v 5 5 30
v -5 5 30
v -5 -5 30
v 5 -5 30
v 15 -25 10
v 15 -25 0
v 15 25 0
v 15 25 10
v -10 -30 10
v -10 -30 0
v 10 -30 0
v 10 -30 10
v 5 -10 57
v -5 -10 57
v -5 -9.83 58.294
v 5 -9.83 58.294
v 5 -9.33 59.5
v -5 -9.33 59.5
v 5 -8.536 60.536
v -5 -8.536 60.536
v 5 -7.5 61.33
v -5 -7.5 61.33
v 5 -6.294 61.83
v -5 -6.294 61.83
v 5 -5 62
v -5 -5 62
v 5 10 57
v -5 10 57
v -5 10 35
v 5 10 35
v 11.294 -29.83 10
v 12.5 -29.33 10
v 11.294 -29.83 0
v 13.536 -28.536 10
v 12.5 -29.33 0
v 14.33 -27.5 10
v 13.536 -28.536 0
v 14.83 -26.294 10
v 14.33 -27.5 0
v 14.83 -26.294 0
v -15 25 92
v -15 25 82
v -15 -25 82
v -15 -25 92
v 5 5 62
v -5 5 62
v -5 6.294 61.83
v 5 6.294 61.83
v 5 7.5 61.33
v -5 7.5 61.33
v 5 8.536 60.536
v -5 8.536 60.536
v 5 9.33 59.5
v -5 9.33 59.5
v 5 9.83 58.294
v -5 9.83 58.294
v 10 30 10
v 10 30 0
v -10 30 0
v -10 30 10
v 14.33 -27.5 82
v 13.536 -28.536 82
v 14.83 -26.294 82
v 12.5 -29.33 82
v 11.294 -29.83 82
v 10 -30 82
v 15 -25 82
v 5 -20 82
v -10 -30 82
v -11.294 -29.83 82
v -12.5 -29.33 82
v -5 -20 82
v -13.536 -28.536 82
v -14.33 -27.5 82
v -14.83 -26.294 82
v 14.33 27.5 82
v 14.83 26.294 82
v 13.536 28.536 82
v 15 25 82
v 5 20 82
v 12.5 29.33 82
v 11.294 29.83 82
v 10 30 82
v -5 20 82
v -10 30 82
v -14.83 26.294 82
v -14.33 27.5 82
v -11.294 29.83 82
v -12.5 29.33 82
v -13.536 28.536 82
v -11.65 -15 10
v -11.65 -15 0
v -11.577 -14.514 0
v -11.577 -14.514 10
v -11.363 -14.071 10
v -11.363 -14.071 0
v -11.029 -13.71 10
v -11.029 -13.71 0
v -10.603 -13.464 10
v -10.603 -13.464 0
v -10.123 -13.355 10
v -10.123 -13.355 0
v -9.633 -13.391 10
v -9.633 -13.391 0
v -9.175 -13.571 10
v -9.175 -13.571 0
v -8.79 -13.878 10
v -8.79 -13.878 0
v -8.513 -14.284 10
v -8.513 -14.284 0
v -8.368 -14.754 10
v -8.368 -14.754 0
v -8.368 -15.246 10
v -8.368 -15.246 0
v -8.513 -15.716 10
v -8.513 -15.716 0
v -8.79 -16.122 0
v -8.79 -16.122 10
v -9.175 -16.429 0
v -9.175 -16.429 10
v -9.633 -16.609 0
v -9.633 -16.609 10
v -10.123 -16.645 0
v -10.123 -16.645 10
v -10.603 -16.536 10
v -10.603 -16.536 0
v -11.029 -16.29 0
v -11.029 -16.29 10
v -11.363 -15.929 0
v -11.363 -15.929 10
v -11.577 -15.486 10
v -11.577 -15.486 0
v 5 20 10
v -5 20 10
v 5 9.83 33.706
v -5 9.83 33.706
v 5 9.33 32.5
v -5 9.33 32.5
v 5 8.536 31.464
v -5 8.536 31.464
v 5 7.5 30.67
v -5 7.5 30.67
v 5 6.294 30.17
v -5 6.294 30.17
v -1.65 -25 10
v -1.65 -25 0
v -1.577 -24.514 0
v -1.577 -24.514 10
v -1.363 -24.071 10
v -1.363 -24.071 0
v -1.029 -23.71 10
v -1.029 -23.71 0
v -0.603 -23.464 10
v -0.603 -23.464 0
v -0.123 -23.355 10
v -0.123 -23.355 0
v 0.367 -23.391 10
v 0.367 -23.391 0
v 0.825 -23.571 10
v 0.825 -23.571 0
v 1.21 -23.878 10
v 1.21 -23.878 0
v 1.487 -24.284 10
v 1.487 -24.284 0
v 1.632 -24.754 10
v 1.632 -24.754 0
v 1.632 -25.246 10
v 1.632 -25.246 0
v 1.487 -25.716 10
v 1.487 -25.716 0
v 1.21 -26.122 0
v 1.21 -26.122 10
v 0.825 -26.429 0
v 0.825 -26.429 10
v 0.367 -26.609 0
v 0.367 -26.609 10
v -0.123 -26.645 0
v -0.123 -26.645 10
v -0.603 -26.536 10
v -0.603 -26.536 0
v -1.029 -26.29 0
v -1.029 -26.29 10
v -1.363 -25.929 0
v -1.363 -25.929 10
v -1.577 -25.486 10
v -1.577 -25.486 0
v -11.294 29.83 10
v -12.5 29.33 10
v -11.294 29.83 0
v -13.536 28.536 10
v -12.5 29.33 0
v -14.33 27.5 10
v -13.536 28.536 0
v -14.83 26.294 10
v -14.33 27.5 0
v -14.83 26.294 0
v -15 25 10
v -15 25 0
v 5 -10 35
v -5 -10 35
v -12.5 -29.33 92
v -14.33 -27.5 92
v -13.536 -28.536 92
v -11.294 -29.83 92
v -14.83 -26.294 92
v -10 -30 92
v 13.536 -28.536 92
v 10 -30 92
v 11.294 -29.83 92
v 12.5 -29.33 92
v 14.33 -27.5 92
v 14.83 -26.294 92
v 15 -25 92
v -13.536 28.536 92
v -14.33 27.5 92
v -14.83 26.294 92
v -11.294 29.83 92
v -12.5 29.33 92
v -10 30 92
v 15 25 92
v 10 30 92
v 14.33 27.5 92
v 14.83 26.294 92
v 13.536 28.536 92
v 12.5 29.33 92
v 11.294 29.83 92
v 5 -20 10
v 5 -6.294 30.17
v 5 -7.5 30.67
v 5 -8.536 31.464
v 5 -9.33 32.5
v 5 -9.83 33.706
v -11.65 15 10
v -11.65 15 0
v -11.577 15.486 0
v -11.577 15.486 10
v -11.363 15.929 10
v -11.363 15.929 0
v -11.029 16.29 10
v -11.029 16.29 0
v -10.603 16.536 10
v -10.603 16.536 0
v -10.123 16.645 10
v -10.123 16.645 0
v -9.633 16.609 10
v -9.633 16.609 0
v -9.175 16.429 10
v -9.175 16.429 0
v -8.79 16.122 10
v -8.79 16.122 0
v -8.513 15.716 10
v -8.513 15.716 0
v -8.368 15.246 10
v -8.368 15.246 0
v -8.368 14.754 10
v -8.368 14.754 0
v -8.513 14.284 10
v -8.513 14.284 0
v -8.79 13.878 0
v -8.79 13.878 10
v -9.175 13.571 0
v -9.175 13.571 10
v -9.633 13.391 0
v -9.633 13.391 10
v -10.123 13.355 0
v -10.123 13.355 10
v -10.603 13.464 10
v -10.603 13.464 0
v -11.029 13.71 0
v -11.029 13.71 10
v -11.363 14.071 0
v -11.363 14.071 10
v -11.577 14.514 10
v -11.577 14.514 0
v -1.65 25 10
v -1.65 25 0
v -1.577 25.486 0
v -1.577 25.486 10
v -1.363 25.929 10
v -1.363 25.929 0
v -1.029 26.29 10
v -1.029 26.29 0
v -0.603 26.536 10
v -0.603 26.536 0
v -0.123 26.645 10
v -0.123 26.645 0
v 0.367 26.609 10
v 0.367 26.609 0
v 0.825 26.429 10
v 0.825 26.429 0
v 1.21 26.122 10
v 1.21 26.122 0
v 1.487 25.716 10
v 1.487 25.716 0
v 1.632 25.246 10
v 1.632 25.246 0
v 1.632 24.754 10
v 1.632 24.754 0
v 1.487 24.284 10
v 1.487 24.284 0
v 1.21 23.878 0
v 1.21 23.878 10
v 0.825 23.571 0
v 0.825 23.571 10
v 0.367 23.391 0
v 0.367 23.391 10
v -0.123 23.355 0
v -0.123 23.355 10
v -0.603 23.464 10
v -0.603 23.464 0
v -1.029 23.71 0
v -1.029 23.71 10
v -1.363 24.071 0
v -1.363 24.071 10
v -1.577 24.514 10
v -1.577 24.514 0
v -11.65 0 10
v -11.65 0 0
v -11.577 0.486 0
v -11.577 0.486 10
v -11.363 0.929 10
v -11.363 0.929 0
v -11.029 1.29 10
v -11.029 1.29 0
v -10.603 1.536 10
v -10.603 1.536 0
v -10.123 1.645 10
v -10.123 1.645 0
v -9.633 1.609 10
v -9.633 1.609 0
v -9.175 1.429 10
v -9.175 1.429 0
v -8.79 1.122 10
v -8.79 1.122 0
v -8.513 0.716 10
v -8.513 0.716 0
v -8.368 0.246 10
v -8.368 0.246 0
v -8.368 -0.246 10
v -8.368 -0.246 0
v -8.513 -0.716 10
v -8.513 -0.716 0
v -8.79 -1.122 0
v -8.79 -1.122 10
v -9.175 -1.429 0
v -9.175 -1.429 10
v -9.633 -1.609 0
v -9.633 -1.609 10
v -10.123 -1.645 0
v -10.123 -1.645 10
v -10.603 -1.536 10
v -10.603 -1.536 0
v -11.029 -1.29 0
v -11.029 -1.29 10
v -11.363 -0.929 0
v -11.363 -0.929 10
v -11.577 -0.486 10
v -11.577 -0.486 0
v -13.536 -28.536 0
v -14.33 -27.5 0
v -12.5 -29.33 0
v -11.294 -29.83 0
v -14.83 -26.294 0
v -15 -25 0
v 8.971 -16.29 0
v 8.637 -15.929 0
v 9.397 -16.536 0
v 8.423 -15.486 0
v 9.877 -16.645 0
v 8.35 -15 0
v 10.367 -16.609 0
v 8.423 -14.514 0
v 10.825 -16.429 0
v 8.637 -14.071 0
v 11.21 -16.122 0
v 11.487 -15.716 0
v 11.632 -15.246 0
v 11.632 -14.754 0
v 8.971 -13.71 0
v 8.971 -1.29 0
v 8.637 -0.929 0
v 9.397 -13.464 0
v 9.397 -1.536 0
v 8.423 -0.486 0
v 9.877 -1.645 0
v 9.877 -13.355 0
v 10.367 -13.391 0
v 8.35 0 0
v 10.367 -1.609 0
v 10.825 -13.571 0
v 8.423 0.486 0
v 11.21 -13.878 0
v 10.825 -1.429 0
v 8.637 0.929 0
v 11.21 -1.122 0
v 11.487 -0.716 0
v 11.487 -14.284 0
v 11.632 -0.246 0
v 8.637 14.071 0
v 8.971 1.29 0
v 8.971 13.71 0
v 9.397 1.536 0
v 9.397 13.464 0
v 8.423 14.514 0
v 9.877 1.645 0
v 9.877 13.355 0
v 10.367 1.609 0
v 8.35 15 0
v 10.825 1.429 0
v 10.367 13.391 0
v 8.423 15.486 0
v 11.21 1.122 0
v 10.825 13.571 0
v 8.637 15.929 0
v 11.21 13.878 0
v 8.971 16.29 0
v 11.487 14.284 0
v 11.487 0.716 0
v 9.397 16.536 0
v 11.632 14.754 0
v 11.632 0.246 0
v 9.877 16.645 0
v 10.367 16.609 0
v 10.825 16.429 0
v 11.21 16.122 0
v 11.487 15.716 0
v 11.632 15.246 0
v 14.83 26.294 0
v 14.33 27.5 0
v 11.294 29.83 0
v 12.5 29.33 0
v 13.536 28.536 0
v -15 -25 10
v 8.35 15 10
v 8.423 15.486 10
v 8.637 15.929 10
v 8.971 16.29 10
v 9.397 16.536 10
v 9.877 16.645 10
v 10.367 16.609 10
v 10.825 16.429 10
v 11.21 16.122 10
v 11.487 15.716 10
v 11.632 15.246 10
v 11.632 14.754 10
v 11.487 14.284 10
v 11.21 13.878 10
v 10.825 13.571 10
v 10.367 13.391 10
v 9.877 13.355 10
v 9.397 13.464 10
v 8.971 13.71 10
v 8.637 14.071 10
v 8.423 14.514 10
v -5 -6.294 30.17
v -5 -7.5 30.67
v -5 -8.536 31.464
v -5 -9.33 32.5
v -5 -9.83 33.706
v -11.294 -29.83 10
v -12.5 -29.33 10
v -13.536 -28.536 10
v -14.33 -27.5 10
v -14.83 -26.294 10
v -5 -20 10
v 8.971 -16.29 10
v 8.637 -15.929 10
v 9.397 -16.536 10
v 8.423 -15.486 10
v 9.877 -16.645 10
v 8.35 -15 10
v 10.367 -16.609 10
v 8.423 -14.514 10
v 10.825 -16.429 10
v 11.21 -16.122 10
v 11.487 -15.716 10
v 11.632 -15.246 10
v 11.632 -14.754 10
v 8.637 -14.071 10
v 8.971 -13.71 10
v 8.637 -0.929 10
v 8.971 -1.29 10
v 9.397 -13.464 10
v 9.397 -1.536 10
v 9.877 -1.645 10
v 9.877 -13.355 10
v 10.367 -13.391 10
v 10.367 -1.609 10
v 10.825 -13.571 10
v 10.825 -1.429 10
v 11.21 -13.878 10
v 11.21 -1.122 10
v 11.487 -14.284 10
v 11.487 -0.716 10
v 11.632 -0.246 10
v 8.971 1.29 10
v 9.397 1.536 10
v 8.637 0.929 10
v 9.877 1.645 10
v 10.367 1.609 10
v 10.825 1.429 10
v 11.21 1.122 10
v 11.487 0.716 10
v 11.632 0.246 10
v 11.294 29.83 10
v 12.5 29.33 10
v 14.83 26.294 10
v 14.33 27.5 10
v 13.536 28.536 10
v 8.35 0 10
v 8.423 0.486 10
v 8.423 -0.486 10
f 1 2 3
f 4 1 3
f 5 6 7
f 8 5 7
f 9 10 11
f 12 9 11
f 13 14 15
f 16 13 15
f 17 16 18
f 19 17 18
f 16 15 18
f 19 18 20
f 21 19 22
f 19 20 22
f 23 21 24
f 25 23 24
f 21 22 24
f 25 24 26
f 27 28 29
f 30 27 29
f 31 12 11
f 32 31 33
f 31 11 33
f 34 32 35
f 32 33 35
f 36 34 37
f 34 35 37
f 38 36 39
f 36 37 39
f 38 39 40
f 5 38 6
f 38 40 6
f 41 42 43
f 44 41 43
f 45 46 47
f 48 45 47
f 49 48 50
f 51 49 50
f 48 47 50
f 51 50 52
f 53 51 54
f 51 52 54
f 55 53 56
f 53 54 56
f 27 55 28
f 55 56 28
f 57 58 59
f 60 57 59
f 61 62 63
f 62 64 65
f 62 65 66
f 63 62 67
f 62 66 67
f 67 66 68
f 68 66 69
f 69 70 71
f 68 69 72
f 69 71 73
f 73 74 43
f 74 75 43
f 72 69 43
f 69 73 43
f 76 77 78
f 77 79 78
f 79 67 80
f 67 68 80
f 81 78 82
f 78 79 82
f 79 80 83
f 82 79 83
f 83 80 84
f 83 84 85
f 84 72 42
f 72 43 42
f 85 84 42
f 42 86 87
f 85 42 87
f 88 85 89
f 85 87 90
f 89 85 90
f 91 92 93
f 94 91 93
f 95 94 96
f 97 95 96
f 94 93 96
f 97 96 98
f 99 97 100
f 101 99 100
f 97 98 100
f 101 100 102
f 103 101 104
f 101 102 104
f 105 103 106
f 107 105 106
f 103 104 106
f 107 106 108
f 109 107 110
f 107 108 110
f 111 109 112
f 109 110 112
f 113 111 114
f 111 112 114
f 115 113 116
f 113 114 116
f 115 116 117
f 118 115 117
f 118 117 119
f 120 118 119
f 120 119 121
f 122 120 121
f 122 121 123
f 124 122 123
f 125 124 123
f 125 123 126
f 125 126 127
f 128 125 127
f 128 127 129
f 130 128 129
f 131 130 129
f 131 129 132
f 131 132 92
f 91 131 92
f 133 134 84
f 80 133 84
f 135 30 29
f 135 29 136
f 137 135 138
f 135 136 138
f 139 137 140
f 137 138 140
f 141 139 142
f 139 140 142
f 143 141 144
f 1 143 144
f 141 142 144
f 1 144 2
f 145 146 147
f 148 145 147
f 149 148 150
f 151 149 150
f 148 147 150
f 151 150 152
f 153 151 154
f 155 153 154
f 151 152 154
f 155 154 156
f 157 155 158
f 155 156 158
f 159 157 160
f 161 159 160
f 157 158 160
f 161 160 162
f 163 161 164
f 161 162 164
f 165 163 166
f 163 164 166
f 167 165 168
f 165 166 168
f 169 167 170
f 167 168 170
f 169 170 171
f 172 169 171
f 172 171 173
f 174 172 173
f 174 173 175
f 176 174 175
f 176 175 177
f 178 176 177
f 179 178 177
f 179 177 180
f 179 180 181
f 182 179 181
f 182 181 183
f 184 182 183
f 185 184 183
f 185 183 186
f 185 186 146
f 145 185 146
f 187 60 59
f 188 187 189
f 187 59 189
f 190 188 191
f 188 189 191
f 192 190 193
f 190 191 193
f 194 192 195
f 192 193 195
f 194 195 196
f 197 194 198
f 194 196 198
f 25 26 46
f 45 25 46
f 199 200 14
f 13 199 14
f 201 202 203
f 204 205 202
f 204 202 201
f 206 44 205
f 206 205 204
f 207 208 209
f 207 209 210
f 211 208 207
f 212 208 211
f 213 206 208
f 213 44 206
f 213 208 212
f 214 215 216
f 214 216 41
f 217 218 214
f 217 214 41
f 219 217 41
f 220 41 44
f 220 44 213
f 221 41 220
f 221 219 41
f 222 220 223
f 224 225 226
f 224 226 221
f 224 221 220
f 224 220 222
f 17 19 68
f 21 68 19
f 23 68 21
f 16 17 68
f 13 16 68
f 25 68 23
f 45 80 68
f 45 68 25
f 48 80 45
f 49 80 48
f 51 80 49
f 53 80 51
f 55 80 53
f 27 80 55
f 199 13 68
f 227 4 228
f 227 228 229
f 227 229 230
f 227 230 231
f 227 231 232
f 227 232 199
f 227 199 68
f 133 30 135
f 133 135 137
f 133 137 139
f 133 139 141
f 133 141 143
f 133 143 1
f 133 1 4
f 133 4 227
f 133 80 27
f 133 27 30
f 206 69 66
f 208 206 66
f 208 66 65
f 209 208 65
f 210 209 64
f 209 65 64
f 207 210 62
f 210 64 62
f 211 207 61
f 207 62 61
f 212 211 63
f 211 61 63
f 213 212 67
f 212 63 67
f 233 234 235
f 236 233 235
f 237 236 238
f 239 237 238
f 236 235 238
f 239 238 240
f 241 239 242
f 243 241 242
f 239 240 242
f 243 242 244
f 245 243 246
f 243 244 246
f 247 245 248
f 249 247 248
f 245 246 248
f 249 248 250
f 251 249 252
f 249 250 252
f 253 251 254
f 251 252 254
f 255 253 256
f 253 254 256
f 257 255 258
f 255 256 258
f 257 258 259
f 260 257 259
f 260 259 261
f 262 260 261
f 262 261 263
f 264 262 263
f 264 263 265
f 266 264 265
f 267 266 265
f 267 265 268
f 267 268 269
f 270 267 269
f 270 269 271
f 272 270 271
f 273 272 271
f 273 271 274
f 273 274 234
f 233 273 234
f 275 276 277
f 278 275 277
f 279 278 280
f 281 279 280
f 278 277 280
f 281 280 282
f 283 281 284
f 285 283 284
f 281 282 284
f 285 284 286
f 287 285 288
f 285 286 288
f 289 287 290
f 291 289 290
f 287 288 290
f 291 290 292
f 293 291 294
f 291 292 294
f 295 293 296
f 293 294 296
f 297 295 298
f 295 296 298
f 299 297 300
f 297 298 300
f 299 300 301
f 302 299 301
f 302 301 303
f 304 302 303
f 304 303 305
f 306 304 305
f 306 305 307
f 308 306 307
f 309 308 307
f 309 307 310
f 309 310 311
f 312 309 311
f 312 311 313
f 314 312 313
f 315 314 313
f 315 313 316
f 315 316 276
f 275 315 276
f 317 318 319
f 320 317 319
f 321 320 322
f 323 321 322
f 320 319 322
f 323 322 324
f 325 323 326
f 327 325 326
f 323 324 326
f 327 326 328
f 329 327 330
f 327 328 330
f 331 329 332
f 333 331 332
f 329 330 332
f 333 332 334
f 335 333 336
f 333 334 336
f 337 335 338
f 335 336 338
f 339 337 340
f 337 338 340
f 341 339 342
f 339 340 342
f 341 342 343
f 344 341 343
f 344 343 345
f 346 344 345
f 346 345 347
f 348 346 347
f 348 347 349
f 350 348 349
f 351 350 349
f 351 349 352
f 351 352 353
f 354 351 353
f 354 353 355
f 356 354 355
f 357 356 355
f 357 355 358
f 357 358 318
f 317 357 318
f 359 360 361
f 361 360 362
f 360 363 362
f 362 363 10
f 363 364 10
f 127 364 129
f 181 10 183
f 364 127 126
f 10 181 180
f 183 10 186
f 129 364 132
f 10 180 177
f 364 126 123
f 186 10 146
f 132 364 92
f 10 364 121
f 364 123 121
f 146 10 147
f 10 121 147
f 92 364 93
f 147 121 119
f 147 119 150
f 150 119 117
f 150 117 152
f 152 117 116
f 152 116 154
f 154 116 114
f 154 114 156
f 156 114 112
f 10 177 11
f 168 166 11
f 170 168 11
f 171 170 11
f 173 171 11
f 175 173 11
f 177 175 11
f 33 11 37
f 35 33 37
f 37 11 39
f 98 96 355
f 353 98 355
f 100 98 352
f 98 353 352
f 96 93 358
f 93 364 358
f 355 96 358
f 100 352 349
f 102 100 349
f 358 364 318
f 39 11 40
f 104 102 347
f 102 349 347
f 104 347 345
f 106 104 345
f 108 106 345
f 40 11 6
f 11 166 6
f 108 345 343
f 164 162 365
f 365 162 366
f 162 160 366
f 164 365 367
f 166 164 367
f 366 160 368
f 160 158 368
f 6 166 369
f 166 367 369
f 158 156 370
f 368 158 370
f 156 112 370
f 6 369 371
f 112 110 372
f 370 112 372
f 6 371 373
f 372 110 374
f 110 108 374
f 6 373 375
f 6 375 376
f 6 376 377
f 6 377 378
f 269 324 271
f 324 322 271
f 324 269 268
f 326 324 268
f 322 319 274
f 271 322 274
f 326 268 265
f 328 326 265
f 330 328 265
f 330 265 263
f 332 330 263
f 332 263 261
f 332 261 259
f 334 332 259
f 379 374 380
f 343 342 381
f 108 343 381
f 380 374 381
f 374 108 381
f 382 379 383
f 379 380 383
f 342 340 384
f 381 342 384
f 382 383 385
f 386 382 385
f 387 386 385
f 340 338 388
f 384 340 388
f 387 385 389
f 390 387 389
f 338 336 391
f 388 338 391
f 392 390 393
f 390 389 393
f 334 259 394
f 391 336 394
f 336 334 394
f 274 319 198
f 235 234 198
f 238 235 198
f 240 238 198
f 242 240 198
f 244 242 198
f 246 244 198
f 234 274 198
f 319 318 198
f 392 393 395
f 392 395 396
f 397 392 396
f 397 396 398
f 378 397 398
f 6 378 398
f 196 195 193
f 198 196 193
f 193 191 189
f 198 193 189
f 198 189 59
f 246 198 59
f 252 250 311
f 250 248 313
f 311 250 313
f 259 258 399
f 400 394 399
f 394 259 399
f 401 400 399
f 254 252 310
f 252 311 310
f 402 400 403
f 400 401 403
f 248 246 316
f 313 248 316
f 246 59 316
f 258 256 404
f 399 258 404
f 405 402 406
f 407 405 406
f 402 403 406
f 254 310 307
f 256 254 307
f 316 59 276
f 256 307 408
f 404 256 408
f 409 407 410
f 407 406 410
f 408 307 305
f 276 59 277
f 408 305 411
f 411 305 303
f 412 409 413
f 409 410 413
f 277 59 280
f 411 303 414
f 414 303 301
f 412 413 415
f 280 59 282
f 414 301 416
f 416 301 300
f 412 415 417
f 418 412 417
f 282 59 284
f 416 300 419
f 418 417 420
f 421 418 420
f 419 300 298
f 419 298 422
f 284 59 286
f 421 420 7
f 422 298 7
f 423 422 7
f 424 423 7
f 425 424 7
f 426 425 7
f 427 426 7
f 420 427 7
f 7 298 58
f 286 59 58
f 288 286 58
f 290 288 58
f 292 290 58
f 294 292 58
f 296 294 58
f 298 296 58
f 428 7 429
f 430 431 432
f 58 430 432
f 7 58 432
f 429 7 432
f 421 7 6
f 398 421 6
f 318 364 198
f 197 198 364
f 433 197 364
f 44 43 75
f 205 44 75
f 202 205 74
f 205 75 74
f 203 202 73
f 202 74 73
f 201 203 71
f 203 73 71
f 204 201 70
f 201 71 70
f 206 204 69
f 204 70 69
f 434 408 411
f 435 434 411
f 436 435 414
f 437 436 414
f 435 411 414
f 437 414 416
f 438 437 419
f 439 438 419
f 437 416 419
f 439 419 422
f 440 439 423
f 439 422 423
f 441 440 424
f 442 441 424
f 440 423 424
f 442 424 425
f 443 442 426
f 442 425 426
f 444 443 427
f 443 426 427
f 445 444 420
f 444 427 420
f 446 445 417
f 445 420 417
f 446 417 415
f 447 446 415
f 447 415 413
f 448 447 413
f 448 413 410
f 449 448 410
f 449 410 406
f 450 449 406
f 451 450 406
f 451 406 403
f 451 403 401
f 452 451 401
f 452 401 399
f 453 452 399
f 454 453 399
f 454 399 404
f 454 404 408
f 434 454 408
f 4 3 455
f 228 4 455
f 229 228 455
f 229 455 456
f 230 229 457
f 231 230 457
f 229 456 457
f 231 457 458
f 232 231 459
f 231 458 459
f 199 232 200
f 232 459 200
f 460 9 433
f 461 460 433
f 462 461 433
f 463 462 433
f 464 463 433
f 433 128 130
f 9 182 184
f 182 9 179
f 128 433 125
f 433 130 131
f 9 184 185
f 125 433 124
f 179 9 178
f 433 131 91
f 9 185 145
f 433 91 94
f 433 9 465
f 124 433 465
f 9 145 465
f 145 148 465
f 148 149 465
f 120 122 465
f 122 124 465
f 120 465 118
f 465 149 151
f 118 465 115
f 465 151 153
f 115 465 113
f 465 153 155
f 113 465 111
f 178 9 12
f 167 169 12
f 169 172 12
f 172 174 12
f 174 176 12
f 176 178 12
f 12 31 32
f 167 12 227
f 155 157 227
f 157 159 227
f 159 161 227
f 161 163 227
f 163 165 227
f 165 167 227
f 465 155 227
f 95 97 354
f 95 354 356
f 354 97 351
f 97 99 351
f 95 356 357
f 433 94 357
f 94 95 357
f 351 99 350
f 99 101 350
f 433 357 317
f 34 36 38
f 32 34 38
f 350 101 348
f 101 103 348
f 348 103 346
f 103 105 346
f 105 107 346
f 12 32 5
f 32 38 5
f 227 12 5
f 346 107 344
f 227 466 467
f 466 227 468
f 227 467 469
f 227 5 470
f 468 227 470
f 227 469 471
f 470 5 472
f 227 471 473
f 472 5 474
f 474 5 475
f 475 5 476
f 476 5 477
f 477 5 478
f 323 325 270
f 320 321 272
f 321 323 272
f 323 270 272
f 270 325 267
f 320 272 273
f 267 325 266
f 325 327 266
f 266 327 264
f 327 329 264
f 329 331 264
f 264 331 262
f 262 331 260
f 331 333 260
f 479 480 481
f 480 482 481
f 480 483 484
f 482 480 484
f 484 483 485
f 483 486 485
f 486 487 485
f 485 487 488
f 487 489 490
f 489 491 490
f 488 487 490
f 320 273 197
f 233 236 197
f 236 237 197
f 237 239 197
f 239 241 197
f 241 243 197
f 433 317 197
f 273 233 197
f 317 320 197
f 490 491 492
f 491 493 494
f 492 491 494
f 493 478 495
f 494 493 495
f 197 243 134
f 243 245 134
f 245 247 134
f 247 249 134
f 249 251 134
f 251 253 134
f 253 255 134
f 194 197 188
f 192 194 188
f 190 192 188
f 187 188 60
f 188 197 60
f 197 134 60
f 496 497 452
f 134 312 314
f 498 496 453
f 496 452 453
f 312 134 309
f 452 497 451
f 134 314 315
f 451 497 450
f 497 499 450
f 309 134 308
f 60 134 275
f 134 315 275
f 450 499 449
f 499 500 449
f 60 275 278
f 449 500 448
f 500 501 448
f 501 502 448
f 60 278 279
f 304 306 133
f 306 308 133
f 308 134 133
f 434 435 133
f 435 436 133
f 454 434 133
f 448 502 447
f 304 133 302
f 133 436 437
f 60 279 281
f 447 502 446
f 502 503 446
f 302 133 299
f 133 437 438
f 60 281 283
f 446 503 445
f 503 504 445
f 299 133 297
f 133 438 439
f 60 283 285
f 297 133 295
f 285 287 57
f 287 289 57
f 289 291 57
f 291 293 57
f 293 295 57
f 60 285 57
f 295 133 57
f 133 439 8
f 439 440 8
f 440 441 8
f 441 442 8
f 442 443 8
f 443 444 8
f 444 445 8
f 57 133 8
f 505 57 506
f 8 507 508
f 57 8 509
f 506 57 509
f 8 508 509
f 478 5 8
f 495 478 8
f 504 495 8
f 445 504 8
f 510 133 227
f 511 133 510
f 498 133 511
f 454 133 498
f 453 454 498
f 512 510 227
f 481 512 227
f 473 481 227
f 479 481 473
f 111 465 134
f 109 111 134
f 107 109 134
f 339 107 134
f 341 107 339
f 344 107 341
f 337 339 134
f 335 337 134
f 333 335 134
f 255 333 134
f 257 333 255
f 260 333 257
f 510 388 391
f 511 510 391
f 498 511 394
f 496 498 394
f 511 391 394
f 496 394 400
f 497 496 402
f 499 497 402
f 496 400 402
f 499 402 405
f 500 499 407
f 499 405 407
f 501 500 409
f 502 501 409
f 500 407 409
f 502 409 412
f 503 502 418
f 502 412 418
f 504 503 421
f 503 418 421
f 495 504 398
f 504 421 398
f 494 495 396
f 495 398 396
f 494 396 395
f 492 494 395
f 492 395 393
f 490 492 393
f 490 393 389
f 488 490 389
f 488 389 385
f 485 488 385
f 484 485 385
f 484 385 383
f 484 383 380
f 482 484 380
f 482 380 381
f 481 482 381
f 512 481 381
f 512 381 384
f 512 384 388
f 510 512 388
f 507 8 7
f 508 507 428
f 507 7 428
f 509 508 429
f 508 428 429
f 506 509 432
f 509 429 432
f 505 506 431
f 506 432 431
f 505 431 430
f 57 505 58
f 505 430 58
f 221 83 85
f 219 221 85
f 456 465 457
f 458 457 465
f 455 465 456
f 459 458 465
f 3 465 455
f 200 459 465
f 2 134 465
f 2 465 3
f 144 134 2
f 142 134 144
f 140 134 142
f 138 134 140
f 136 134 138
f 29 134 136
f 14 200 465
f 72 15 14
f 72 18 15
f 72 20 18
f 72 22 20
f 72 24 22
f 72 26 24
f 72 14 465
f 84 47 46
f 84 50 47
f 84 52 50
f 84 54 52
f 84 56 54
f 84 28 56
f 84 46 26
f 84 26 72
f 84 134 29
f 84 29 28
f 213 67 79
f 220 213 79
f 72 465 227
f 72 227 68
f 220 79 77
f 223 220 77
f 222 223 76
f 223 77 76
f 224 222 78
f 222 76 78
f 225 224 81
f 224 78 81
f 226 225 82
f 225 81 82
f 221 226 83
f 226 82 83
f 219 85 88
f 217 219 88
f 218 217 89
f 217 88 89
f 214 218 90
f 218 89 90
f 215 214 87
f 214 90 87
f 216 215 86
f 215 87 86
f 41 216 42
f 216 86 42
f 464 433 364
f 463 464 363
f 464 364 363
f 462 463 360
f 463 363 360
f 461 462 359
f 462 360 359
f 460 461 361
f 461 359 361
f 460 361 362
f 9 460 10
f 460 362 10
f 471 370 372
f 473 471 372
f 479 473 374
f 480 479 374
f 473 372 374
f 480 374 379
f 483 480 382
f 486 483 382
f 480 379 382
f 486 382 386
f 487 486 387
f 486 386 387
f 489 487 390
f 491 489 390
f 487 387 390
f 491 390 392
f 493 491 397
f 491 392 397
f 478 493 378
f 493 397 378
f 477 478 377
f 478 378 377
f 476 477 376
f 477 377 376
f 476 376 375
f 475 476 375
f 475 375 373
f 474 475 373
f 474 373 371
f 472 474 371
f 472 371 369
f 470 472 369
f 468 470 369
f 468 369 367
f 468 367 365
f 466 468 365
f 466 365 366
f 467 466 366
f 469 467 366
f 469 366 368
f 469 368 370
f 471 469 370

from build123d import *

# Parameters (mm, degrees)
BOSS_EXTRUDE1_DEPTH       = 92
CUT_EXTRUDE1_DEPTH        = 102.311401135
CUT_EXTRUDE1_DEPTH_BACK   = 10
SKETCH3_W                 = 72
SKETCH3_H                 = 50
CUT_EXTRUDE2_DEPTH        = 10
SKETCH4_W                 = 72
SKETCH4_H                 = 10
CUT_EXTRUDE3_DEPTH        = 10
SKETCH5_W                 = 72
SKETCH5_H                 = 10
CUT_EXTRUDE4_DEPTH        = 10
M4X0_7_TAPPED_HOLE1_D     = 3.3
M4X0_7_TAPPED_HOLE1_DEPTH = 10
M4X0_7_TAPPED_HOLE2_D     = 3.3
M4X0_7_TAPPED_HOLE2_DEPTH = 10
M4X0_7_TAPPED_HOLE3_D     = 3.3
M4X0_7_TAPPED_HOLE3_DEPTH = 10
M4X0_7_TAPPED_HOLE4_D     = 3.3
M4X0_7_TAPPED_HOLE4_DEPTH = 10
M4X0_7_TAPPED_HOLE5_D     = 3.3
M4X0_7_TAPPED_HOLE5_DEPTH = 10
M4X0_7_TAPPED_HOLE6_D     = 3.3
M4X0_7_TAPPED_HOLE6_DEPTH = 10
M4X0_7_TAPPED_HOLE7_D     = 3.3
M4X0_7_TAPPED_HOLE7_DEPTH = 10
M4X0_7_TAPPED_HOLE8_D     = 3.3
M4X0_7_TAPPED_HOLE8_DEPTH = 10
CUT_EXTRUDE5_DEPTH        = 10
CUT_EXTRUDE8_DEPTH        = 10
CUT_EXTRUDE9_DEPTH        = 10


with BuildPart() as part:
    # Sketch1 → Boss-Extrude1 (new body)
    with BuildSketch(Plane.XY):
        with BuildLine():
            Line((-10, -30), (10, -30))
            ThreePointArc((10, -30), (13.535533906, -28.535533906), (15, -25))
            Line((15, -25), (15, 25))
            ThreePointArc((15, 25), (13.535533906, 28.535533906), (10, 30))
            Line((10, 30), (-10, 30))
            ThreePointArc((-10, 30), (-13.535533906, 28.535533906), (-15, 25))
            Line((-15, 25), (-15, -25))
            ThreePointArc((-15, -25), (-13.535533906, -28.535533906), (-10, -30))
        make_face()
    extrude(amount=BOSS_EXTRUDE1_DEPTH)

    # Sketch2 → Cut-Extrude1 (cut, two sides: drawn at the far end of the back side and taken through both)
    with BuildSketch(Plane(origin=(15, 0, 0), x_dir=(0, 0, -1), z_dir=(1, 0, 0)).offset(-CUT_EXTRUDE1_DEPTH_BACK)):
        Polygon((-10, 25), (-82, 25), (-82, -25), (-10, -25), (-10, 0), align=None)
    extrude(amount=CUT_EXTRUDE1_DEPTH + CUT_EXTRUDE1_DEPTH_BACK, mode=Mode.SUBTRACT)

    # Sketch3 → Cut-Extrude2 (cut)
    with BuildSketch(Plane.ZY.offset(15)):
        with Locations((46, 0)):
            Rectangle(SKETCH3_W, SKETCH3_H)
    extrude(amount=-CUT_EXTRUDE2_DEPTH, mode=Mode.SUBTRACT)

    # Sketch4 → Cut-Extrude3 (cut)
    with BuildSketch(Plane.ZY.offset(5)):
        with Locations((46, 25)):
            Rectangle(SKETCH4_W, SKETCH4_H)
    extrude(amount=-CUT_EXTRUDE3_DEPTH, mode=Mode.SUBTRACT)

    # Sketch5 → Cut-Extrude4 (cut)
    with BuildSketch(Plane.ZY.offset(5)):
        with Locations((46, -25)):
            Rectangle(SKETCH5_W, SKETCH5_H)
    extrude(amount=-CUT_EXTRUDE4_DEPTH, mode=Mode.SUBTRACT)

    # M4x0.7 Tapped Hole1
    with Locations(Plane.XY.offset(10)):
        with Locations((10, -15)):
            Hole(M4X0_7_TAPPED_HOLE1_D / 2, depth=M4X0_7_TAPPED_HOLE1_DEPTH)

    # M4x0.7 Tapped Hole2
    with Locations(Plane.XY.offset(10)):
        with Locations((10, 0)):
            Hole(M4X0_7_TAPPED_HOLE2_D / 2, depth=M4X0_7_TAPPED_HOLE2_DEPTH)

    # M4x0.7 Tapped Hole3
    with Locations(Plane.XY.offset(10)):
        with Locations((10, 15)):
            Hole(M4X0_7_TAPPED_HOLE3_D / 2, depth=M4X0_7_TAPPED_HOLE3_DEPTH)

    # M4x0.7 Tapped Hole4
    with Locations(Plane.XY.offset(10)):
        with Locations((-10, -15)):
            Hole(M4X0_7_TAPPED_HOLE4_D / 2, depth=M4X0_7_TAPPED_HOLE4_DEPTH)

    # M4x0.7 Tapped Hole5
    with Locations(Plane.XY.offset(10)):
        with Locations((-10, 0)):
            Hole(M4X0_7_TAPPED_HOLE5_D / 2, depth=M4X0_7_TAPPED_HOLE5_DEPTH)

    # M4x0.7 Tapped Hole6
    with Locations(Plane.XY.offset(10)):
        with Locations((-10, 15)):
            Hole(M4X0_7_TAPPED_HOLE6_D / 2, depth=M4X0_7_TAPPED_HOLE6_DEPTH)

    # M4x0.7 Tapped Hole7
    with Locations(Plane.XY.offset(10)):
        with Locations((0, 25)):
            Hole(M4X0_7_TAPPED_HOLE7_D / 2, depth=M4X0_7_TAPPED_HOLE7_DEPTH)

    # M4x0.7 Tapped Hole8
    with Locations(Plane.XY.offset(10)):
        with Locations((0, -25)):
            Hole(M4X0_7_TAPPED_HOLE8_D / 2, depth=M4X0_7_TAPPED_HOLE8_DEPTH)

    # Sketch27 → Cut-Extrude5 (cut)
    with BuildSketch(Plane.ZY.offset(5)):
        with BuildLine():
            Line((62, 0), (62, 5))
            ThreePointArc((62, 5), (60.535533906, 8.535533906), (57, 10))
            Line((57, 10), (35, 10))
            ThreePointArc((35, 10), (31.464466094, 8.535533906), (30, 5))
            Line((30, 5), (30, 0))
            Line((30, 0), (30, -5))
            ThreePointArc((30, -5), (31.464466094, -8.535533906), (35, -10))
            Line((35, -10), (57, -10))
            ThreePointArc((57, -10), (60.535533906, -8.535533906), (62, -5))
            Line((62, -5), (62, 0))
        make_face()
    extrude(amount=-CUT_EXTRUDE5_DEPTH, mode=Mode.SUBTRACT)

    # Sketch29 → Cut-Extrude8 (cut)
    with BuildSketch(Plane.ZY.offset(15)):
        Polygon((82, -25), (82, 25), (82, 39.435498448), (10, 39.435498448), (10, -37.130826461), (82, -37.130826461), align=None)
    extrude(amount=-CUT_EXTRUDE8_DEPTH, mode=Mode.SUBTRACT)

    # Sketch30 → Cut-Extrude9 (cut)
    with BuildSketch(Plane(origin=(15, 0, 0), x_dir=(0, 0, -1), z_dir=(1, 0, 0))):
        Polygon((-82, 25), (-82, -25), (-82, -44.187859425), (-10, -44.187859425), (-10, -25), (-10, 35.921267628), (-82, 35.921267628), align=None)
    extrude(amount=-CUT_EXTRUDE9_DEPTH, mode=Mode.SUBTRACT)


solid = part.part
